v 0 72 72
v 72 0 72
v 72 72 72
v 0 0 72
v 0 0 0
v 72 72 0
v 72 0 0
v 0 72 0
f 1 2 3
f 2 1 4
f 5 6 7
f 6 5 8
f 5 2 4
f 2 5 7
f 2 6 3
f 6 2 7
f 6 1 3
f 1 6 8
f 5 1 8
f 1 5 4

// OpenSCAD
epaisseur = 4;
hauteur_totale = 68+epaisseur;
hauteur_min_freebox = 48;

cube([hauteur_totale,hauteur_totale,hauteur_totale]);

module corner_FR() {
    
}

module corner_FL() {
    
}

module corner_RR() {
    
}

module corner_RL() {
    
}
